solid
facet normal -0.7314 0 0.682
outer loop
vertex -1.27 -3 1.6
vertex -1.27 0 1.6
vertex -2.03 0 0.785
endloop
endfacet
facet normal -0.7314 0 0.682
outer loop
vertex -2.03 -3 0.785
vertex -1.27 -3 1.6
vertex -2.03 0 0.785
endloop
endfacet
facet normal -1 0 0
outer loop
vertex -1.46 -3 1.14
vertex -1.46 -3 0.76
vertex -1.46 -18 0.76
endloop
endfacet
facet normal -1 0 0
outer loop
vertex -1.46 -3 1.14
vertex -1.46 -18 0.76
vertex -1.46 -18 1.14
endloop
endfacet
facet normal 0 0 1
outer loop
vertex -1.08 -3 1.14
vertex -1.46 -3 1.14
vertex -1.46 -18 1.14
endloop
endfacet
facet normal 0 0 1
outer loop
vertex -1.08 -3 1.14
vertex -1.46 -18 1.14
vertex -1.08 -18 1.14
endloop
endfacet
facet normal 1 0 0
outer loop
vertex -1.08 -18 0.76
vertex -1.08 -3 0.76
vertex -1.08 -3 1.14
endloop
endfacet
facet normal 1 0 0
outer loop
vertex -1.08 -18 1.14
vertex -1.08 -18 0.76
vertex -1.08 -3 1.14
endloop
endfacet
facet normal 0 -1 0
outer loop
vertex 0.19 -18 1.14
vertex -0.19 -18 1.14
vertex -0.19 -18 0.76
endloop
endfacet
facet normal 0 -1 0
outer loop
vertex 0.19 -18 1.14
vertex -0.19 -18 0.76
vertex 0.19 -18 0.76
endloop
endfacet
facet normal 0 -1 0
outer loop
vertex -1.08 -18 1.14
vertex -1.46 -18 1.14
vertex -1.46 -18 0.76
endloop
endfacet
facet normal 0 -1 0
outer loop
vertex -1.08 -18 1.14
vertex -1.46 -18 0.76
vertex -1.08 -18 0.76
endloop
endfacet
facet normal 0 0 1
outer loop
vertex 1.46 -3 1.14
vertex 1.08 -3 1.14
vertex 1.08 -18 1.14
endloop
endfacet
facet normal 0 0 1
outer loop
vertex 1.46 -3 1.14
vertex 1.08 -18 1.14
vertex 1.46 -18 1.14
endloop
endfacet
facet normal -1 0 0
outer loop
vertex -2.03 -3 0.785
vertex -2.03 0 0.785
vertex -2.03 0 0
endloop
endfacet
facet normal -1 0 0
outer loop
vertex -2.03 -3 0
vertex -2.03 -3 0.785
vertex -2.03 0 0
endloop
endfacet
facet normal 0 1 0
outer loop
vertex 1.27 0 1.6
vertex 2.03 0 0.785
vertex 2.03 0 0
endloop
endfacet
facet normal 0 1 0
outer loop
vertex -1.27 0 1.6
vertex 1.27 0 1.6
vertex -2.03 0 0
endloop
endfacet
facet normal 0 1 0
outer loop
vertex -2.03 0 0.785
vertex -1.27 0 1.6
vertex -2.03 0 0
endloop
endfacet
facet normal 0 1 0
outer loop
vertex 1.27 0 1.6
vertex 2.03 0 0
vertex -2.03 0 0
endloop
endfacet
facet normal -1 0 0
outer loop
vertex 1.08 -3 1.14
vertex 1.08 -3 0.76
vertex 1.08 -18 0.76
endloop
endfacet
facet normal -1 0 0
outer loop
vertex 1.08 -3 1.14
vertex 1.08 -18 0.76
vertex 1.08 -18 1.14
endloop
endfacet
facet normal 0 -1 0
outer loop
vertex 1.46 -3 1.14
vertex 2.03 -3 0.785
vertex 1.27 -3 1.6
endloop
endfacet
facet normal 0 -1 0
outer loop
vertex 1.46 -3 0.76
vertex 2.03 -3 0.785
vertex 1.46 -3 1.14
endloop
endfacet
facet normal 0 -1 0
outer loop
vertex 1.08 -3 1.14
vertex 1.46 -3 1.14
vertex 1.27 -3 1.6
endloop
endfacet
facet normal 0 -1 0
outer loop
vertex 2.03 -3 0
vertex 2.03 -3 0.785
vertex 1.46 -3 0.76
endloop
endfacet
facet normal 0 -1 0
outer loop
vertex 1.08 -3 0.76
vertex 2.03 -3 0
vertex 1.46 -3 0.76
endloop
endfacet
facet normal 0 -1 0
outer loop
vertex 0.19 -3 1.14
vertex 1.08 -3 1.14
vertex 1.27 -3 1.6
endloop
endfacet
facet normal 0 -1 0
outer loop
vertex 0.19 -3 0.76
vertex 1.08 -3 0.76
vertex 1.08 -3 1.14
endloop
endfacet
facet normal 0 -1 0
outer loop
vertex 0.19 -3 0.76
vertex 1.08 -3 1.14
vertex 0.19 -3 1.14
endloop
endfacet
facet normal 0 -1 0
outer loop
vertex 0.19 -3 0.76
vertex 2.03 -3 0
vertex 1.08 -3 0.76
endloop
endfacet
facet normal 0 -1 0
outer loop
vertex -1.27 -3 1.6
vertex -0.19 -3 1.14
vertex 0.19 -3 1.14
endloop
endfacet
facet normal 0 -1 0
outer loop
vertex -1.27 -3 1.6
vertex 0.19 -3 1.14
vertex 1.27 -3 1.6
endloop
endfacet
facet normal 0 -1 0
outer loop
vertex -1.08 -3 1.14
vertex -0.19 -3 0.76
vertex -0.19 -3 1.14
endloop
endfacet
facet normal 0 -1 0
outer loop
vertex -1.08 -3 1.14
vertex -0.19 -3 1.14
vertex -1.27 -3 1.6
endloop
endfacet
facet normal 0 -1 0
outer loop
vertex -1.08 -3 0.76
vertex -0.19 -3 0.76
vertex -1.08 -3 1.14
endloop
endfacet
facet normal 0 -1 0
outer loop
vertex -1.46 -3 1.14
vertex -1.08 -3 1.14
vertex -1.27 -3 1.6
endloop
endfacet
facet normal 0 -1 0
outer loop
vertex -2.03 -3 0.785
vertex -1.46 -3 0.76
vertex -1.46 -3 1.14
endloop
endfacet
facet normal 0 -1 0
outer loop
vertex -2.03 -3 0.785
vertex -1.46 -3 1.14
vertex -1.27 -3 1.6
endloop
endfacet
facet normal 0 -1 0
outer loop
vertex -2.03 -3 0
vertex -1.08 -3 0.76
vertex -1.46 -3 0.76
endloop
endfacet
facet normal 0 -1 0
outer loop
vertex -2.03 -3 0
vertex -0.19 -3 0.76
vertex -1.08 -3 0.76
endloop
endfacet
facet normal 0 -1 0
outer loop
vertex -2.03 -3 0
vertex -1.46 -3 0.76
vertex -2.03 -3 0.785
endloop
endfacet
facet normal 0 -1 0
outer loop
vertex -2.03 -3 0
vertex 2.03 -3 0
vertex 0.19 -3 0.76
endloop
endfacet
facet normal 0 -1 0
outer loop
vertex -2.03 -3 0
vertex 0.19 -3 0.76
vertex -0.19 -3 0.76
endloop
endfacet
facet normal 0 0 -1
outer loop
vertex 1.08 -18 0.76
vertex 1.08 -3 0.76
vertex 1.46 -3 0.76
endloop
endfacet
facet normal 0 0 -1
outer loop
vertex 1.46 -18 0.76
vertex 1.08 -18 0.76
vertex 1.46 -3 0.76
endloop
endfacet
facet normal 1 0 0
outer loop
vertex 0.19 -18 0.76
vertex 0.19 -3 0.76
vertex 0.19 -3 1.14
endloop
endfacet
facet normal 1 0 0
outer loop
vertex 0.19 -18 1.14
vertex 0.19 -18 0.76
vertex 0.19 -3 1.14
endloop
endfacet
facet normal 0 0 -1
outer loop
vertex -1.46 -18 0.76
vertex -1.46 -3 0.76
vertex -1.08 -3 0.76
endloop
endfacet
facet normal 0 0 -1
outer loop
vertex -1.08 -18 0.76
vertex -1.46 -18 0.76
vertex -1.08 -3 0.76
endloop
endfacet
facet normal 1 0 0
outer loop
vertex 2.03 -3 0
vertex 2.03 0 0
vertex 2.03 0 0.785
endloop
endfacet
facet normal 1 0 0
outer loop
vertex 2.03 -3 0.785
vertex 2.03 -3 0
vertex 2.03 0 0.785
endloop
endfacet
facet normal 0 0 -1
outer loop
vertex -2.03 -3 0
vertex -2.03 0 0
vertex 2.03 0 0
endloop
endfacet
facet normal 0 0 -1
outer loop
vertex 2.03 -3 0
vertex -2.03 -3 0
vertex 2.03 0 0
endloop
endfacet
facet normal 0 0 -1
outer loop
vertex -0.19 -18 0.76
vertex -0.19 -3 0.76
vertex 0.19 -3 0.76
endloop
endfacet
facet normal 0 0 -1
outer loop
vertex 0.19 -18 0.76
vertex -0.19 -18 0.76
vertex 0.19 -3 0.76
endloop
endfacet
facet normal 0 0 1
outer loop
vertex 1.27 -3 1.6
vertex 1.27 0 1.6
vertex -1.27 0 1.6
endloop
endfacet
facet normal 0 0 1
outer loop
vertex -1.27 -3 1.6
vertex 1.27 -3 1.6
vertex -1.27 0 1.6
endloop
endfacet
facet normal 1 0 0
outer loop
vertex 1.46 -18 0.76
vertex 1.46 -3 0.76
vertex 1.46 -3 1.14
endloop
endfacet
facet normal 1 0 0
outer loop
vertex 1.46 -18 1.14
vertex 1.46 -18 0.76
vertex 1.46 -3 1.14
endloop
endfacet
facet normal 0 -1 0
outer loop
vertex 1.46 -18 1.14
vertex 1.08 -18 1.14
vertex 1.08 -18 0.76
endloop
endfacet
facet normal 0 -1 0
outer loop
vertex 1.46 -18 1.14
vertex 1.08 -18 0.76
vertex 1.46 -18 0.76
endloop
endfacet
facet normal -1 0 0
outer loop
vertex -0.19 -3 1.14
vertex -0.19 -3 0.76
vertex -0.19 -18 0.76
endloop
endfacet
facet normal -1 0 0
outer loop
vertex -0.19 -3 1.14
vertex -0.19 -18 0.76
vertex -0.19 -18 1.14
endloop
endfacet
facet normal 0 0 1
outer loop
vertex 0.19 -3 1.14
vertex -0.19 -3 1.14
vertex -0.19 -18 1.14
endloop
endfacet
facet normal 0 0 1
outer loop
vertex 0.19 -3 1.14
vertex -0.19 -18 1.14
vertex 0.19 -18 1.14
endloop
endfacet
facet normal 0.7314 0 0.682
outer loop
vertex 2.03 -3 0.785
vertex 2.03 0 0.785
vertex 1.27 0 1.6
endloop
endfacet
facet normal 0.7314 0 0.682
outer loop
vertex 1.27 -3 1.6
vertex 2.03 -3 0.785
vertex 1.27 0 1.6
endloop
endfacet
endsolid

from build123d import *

# Parameters (mm, degrees)
BOSS_EXTRUDE1_DEPTH = 3
SKETCH3_W           = 0.38
SKETCH3_H           = 0.38
BOSS_EXTRUDE2_DEPTH = 15


with BuildPart() as part:
    # PROF_TOP_VIEW → Boss-Extrude1 (new body)
    with BuildSketch(Plane(origin=(0, 0, 0), x_dir=(1, 0, 0), z_dir=(0, 1, 0))):
        Polygon((-2.03, 0), (2.03, 0), (2.03, -0.78499978), (1.27, -1.6), (-1.27, -1.6), (-2.03, -0.78499978), align=None)
    extrude(amount=-BOSS_EXTRUDE1_DEPTH)

    # Sketch3 → Boss-Extrude2 (add)
    with BuildSketch(Plane.XZ.offset(3)):
        with Locations((-1.27, 0.95)):
            Rectangle(SKETCH3_W, SKETCH3_H)
        with Locations((0, 0.95)):
            Rectangle(SKETCH3_W, SKETCH3_H)
        with Locations((1.27, 0.95)):
            Rectangle(SKETCH3_W, SKETCH3_H)
    extrude(amount=BOSS_EXTRUDE2_DEPTH)


solid = part.part
